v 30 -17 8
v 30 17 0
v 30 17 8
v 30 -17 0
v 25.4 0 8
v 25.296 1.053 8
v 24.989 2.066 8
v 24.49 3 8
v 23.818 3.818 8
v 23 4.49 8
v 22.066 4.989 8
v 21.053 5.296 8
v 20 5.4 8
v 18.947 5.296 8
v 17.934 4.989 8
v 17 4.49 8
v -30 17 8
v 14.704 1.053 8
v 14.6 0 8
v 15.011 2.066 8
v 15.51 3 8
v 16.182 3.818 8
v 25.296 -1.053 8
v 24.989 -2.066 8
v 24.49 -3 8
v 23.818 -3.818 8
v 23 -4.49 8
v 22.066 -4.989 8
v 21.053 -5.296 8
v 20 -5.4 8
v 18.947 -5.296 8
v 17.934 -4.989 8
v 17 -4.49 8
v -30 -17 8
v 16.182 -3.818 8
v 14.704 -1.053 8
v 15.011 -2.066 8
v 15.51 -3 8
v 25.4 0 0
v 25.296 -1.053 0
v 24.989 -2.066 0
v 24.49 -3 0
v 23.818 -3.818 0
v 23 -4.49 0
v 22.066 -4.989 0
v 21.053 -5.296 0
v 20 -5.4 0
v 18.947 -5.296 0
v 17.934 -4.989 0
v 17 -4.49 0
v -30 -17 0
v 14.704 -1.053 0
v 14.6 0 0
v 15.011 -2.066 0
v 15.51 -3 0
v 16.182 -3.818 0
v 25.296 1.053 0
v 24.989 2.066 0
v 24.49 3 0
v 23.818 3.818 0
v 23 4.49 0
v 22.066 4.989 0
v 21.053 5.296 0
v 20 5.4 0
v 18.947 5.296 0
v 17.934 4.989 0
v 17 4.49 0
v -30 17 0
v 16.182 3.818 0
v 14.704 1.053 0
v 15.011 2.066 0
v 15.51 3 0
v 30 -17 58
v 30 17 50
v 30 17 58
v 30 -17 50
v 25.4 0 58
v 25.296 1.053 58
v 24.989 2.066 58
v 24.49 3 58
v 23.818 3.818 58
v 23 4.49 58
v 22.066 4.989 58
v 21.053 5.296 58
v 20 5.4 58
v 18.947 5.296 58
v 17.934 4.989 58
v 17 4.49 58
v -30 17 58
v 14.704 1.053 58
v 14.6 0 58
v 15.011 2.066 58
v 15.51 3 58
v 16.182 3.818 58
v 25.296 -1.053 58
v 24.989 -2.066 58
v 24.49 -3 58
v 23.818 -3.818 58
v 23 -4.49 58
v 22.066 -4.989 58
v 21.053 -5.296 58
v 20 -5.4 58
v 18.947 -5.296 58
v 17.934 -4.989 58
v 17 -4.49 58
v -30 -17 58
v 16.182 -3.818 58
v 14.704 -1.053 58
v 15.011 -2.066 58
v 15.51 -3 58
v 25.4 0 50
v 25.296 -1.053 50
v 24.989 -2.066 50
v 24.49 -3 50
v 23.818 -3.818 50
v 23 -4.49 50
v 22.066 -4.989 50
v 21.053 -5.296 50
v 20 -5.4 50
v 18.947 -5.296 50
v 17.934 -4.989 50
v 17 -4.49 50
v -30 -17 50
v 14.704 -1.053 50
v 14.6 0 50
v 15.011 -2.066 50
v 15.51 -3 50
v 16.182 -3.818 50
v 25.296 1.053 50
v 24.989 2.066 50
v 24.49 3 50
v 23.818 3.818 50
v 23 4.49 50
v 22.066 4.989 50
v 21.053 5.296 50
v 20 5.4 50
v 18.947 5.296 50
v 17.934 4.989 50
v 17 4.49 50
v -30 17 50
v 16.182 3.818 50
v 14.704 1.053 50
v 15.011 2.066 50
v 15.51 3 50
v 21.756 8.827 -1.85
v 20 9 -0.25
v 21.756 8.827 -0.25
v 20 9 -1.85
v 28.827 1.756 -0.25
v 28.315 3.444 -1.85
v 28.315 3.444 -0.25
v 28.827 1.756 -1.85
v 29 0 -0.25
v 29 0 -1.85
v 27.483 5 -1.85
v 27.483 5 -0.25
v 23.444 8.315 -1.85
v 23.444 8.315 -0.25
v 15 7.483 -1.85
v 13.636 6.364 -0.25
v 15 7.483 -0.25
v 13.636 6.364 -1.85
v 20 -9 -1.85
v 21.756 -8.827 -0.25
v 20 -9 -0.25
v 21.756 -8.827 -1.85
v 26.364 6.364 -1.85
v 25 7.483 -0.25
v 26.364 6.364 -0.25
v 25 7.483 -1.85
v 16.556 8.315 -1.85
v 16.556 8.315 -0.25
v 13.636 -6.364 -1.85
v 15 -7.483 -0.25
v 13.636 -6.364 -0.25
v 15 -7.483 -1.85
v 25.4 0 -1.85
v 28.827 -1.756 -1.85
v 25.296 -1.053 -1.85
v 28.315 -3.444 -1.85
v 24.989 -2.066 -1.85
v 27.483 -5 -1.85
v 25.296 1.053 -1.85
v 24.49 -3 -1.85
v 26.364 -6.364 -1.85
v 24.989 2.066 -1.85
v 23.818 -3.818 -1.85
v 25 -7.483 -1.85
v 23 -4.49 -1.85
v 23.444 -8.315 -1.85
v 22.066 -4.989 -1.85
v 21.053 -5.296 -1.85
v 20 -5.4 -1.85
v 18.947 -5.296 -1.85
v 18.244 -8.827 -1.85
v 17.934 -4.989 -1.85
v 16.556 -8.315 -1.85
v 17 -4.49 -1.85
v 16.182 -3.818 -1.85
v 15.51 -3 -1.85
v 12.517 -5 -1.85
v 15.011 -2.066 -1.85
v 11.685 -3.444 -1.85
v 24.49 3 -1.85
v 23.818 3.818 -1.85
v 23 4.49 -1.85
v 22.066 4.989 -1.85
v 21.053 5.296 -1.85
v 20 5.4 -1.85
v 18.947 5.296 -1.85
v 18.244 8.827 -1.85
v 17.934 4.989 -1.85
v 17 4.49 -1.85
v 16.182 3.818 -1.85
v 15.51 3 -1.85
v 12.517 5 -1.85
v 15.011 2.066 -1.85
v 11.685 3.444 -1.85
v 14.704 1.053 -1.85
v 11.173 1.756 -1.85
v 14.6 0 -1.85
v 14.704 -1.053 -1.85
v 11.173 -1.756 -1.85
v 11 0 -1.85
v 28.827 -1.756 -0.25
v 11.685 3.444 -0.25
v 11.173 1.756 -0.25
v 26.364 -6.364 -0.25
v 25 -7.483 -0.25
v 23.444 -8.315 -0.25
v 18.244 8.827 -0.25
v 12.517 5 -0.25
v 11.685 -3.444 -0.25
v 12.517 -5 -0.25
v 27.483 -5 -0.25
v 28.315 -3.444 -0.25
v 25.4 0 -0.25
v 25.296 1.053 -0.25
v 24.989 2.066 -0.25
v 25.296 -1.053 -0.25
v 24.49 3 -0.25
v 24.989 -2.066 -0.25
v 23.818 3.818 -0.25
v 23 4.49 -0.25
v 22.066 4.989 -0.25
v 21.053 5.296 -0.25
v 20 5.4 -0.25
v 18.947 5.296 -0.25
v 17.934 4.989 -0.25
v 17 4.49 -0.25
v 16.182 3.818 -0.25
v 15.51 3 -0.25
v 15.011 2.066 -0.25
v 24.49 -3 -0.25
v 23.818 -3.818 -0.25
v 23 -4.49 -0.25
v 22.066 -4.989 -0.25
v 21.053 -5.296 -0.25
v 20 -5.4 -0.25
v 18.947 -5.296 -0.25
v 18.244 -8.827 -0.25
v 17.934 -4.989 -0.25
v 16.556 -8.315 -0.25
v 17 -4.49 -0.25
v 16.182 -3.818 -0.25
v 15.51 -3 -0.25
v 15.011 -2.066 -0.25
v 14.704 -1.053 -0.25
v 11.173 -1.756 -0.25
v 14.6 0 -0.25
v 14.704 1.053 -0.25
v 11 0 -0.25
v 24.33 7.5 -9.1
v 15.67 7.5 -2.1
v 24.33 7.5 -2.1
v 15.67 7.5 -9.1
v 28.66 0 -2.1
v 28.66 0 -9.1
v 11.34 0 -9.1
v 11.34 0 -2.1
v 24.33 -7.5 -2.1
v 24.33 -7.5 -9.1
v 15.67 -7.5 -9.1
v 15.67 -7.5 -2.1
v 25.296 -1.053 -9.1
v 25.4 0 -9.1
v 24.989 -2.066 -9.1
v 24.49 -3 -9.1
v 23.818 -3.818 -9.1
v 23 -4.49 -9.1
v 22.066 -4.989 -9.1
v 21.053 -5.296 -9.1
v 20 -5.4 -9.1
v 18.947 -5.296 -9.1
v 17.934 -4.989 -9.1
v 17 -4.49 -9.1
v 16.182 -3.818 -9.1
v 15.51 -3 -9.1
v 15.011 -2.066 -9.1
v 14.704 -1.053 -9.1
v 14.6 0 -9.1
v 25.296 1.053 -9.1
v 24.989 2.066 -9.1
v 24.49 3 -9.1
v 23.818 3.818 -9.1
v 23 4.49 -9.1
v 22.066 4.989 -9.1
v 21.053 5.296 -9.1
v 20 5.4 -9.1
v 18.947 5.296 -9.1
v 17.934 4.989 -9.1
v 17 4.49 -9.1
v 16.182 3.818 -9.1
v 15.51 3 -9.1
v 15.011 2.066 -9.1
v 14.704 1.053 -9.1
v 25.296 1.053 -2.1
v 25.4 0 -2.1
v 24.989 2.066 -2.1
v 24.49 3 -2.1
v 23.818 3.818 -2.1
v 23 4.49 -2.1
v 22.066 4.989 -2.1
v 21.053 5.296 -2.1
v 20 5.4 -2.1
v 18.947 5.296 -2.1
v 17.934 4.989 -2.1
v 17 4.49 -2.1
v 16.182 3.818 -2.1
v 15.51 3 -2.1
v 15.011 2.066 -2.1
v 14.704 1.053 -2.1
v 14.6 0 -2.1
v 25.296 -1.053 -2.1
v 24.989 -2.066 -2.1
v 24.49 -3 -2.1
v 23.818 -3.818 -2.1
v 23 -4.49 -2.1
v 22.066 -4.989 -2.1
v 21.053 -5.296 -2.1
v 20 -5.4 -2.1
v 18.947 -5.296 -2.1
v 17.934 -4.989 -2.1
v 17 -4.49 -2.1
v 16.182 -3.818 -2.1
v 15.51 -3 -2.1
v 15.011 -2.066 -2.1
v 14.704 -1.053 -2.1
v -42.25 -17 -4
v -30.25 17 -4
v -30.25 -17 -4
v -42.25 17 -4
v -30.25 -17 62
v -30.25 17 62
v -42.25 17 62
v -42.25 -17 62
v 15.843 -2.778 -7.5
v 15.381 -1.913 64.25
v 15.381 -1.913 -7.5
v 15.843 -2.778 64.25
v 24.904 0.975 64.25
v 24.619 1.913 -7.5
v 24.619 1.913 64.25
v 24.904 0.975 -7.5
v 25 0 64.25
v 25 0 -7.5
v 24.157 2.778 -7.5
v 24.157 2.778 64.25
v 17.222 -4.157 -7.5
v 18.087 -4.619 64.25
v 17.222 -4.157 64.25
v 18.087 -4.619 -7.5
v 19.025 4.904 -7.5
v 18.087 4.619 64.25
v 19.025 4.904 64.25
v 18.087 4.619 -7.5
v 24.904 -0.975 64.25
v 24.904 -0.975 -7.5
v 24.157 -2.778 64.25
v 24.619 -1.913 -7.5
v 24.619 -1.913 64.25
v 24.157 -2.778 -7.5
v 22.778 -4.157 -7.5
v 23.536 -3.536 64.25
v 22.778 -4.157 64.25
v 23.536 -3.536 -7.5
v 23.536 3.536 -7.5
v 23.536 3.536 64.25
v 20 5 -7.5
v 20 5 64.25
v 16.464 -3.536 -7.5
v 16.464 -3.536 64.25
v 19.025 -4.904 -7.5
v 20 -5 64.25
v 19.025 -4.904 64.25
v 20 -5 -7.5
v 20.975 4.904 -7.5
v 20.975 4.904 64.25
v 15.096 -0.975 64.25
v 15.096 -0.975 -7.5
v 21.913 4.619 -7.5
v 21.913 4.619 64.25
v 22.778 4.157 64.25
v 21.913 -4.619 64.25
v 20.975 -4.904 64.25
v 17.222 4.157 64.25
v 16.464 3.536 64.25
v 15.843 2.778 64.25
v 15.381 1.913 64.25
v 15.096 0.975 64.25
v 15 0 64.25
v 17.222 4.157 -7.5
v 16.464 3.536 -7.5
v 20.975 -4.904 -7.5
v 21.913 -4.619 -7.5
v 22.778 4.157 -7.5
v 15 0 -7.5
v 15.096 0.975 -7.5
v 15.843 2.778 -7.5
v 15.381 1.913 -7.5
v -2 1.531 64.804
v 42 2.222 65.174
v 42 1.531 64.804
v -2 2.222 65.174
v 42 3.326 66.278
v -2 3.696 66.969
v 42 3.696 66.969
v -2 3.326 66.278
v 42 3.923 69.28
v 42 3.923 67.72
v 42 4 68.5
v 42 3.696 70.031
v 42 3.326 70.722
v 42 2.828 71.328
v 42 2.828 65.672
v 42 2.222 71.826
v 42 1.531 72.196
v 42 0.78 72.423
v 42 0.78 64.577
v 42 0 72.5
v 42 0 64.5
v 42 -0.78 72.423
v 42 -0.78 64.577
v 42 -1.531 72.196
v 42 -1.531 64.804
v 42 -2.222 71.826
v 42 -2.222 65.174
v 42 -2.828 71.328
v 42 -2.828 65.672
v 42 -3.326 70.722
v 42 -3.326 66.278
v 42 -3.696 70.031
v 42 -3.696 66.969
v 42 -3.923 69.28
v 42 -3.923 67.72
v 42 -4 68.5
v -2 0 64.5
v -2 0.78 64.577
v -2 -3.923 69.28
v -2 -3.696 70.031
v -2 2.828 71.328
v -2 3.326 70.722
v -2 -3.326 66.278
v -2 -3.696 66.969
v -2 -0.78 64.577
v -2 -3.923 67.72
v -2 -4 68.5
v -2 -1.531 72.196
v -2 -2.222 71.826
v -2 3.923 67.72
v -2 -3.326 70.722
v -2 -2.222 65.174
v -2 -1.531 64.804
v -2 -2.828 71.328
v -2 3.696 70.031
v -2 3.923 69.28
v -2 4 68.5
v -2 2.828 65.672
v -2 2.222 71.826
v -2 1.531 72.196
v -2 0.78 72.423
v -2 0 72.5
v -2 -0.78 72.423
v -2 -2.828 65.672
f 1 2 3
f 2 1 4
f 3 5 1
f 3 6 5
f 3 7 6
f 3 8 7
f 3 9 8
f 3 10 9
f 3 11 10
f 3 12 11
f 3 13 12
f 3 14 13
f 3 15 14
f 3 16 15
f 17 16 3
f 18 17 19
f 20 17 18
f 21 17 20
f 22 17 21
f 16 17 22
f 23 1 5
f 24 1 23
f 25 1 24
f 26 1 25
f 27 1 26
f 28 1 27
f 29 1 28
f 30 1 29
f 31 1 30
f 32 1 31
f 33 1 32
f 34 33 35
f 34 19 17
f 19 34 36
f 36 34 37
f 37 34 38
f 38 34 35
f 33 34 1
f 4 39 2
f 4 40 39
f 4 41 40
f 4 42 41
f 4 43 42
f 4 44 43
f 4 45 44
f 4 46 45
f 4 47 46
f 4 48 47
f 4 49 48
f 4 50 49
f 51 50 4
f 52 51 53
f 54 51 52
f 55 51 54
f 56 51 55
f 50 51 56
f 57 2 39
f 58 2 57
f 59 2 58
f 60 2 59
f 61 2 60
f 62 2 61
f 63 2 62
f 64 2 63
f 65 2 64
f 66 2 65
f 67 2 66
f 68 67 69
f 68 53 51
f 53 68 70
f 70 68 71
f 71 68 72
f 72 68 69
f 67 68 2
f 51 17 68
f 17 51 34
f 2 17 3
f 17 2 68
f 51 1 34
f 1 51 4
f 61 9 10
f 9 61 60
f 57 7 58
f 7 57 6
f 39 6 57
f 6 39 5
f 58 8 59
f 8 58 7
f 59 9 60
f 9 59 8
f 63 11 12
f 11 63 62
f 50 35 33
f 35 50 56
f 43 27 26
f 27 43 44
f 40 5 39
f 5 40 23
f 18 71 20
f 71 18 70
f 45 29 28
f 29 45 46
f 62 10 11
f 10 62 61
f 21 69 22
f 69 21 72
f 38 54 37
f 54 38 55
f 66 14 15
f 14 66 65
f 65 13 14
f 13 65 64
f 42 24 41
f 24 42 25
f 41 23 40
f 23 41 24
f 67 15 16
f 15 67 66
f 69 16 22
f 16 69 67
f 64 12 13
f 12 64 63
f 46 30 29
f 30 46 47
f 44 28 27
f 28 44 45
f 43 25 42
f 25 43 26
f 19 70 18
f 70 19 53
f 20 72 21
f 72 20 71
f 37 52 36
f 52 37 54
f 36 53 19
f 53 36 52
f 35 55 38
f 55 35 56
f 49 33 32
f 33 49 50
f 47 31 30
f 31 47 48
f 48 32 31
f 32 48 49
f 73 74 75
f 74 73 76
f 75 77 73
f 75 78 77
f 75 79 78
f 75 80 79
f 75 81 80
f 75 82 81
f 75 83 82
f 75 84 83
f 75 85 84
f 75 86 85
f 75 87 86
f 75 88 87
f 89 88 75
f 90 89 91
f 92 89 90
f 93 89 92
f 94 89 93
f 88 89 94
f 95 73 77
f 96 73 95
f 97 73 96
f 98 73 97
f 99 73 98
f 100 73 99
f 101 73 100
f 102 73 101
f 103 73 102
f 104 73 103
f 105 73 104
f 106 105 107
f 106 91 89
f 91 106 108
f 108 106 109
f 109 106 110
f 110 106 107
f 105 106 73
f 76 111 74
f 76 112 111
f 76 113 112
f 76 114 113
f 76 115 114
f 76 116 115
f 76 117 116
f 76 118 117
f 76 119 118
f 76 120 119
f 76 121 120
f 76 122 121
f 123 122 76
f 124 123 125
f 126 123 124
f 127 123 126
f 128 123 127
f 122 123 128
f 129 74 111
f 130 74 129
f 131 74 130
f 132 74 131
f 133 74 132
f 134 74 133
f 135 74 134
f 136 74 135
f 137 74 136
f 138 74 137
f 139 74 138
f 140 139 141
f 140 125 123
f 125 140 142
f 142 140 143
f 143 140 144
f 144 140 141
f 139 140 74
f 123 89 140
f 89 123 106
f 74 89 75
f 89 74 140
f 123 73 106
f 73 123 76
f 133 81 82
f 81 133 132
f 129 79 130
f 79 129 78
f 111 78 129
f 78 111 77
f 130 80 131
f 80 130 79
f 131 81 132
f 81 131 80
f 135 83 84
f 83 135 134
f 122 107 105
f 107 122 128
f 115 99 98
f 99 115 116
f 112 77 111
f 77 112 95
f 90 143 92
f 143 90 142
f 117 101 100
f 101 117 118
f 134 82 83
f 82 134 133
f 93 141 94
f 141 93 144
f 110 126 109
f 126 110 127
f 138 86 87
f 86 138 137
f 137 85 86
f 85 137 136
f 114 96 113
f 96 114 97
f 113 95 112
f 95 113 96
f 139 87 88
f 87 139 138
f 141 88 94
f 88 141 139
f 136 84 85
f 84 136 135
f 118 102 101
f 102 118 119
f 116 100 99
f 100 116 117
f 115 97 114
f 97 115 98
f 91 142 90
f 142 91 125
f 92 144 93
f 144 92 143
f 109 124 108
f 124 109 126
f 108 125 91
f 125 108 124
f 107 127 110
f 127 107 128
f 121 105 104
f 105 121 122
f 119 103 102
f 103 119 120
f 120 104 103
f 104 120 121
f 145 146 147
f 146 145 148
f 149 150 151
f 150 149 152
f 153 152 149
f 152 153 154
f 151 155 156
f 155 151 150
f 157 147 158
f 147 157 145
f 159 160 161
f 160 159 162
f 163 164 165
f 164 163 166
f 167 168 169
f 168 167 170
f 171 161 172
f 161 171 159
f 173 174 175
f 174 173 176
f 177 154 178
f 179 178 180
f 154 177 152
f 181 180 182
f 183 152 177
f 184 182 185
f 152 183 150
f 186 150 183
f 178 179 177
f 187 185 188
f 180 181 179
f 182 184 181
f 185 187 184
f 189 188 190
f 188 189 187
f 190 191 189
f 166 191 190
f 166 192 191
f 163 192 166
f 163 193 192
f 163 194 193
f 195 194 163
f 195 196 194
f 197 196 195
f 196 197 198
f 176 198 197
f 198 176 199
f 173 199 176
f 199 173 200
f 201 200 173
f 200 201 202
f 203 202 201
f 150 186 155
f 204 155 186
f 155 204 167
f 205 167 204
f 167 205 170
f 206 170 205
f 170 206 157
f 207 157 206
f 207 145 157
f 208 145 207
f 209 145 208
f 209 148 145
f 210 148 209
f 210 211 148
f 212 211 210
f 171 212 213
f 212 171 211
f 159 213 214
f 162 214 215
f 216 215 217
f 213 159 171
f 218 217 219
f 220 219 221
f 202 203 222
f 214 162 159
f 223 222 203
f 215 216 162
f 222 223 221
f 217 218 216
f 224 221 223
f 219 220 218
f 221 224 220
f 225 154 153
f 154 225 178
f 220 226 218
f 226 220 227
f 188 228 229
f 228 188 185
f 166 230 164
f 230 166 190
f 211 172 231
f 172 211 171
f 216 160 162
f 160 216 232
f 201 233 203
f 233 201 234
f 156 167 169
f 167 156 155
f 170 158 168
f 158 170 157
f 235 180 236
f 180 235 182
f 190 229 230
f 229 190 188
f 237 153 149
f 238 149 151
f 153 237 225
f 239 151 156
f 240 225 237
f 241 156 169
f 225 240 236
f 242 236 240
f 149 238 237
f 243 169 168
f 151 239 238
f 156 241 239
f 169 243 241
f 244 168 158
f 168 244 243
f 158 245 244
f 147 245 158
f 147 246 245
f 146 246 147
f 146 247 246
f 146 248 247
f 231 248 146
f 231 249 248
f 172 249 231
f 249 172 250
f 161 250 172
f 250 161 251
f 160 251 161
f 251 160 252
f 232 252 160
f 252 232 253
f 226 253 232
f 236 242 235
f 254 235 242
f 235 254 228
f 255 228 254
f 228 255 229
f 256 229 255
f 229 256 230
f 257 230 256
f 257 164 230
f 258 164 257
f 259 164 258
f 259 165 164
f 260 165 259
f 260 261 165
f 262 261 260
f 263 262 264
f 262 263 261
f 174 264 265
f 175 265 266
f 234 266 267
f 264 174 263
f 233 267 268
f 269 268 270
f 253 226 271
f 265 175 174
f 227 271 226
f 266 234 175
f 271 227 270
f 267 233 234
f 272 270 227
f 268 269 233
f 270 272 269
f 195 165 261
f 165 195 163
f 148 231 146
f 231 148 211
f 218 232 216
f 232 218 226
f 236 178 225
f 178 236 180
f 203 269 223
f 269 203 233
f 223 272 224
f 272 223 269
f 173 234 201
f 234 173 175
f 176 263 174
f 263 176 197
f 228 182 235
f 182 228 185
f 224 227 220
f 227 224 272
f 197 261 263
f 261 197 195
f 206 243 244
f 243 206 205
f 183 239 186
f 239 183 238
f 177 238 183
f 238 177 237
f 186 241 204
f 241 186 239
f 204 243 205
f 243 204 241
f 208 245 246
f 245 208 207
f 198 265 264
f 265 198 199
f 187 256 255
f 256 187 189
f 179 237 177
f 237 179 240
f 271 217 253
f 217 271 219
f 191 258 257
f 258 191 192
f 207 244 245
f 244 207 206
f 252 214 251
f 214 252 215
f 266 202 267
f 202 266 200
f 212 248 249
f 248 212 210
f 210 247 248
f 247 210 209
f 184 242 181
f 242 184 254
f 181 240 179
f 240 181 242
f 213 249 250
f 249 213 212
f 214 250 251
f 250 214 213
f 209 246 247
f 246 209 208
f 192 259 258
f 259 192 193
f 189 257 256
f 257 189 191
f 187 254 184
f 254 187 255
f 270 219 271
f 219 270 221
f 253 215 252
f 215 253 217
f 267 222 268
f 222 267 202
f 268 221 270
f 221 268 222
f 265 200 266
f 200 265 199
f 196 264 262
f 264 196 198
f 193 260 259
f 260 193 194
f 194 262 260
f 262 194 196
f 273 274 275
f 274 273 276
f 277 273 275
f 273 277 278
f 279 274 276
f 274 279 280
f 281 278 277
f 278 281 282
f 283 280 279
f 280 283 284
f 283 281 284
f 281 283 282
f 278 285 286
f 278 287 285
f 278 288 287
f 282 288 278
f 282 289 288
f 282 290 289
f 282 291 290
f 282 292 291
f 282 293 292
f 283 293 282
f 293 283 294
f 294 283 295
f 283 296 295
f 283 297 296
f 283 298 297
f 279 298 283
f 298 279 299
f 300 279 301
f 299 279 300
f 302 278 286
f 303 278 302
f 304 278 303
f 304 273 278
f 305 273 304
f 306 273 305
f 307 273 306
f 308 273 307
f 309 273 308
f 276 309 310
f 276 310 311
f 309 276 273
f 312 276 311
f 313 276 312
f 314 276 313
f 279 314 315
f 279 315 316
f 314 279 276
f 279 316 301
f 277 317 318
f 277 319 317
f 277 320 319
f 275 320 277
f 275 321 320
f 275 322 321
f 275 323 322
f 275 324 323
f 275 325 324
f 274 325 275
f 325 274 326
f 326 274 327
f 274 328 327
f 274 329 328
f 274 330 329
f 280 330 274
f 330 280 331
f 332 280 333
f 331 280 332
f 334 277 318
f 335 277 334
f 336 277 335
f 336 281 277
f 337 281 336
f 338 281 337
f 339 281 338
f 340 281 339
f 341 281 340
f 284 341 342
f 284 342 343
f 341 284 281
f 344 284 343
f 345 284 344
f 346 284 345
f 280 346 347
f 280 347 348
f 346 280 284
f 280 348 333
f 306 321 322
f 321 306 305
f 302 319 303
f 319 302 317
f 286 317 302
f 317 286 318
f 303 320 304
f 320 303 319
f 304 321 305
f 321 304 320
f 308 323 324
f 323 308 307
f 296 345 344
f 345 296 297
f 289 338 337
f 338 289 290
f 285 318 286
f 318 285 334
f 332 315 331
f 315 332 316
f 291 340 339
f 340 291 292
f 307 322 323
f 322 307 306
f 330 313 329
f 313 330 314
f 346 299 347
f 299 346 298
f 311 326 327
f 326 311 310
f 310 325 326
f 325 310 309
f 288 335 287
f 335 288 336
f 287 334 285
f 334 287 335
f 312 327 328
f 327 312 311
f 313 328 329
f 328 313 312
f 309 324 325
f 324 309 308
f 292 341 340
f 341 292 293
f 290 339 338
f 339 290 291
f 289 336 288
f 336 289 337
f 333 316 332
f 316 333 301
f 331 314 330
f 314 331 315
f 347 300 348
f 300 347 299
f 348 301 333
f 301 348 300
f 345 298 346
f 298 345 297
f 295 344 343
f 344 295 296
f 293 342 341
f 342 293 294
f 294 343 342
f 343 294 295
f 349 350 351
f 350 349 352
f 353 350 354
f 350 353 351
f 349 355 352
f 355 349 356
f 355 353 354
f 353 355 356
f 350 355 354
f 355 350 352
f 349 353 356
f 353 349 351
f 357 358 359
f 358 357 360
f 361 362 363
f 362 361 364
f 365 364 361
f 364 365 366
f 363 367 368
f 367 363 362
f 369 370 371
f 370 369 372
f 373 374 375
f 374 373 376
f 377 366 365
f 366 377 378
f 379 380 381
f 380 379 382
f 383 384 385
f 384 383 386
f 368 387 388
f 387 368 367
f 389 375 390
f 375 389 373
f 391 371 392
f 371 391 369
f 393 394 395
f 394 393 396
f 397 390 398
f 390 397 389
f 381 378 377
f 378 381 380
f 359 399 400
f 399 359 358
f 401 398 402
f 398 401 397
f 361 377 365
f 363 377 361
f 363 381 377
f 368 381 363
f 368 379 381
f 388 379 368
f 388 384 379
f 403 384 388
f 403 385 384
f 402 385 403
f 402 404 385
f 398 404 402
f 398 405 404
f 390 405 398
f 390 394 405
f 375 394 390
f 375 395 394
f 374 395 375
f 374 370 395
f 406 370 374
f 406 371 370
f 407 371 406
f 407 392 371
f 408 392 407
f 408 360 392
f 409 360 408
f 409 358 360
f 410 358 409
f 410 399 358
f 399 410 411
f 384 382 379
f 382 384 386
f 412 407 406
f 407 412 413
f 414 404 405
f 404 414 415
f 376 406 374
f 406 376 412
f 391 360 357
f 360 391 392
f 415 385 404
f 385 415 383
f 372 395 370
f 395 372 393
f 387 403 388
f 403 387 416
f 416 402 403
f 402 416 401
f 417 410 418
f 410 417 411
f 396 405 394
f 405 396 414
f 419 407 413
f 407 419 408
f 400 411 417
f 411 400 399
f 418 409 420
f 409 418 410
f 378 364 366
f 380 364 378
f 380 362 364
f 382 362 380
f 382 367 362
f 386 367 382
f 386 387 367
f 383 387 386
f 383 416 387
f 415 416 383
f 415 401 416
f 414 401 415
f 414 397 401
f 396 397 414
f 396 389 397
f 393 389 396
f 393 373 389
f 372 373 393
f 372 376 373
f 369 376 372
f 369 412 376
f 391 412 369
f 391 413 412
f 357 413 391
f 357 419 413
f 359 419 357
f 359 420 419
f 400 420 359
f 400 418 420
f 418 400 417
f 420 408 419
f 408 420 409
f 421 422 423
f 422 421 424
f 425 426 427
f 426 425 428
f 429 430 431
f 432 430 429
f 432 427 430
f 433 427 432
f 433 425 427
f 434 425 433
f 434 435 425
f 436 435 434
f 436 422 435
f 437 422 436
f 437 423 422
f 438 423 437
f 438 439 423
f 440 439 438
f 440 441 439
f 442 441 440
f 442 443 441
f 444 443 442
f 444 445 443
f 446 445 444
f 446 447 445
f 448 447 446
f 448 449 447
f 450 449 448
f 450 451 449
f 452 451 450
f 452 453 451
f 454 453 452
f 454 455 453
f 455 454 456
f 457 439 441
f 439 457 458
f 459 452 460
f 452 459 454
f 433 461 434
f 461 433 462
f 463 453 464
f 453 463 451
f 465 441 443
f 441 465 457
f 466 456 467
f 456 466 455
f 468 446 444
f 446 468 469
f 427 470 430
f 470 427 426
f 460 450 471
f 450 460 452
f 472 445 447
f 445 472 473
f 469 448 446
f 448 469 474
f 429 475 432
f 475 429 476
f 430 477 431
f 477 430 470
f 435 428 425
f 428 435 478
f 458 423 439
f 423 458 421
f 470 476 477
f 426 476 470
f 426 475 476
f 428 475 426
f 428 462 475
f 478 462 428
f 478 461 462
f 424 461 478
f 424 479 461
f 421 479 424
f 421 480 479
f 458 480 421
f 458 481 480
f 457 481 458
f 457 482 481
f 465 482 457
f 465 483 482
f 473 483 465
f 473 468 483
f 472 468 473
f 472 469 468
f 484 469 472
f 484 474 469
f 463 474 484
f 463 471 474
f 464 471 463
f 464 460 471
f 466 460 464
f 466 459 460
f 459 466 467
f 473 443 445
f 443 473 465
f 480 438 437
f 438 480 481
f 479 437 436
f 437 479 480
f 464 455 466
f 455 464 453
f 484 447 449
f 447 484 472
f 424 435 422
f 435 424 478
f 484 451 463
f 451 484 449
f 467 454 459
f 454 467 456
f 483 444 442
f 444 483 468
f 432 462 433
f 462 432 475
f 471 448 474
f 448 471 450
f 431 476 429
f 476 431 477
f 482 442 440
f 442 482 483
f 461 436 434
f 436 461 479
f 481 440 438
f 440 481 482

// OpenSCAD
$fn = 32;

// ------------------------------------------------------------------------
// C clamp: throat 50 mm, screw d10
// Every part is its own module, assembly() places every instance.
// ------------------------------------------------------------------------

// --- part 1 ---
module clamp_arm() {
  difference() {
    translate([-30, -17, 0]) cube([60, 34, 8]);
    translate([20, 0, -1]) cylinder(h = 10, d = 10.8);
  }
}

// --- part 2 ---
module clamp_spine() {
  difference() {
    translate([-33, -17, 0]) cube([66, 34, 12]);
  }
}

// --- part 3 ---
module clamp_screw() {
  translate([0, 0, -35.875]) cylinder(h = 71.75, d = 10);
}

// --- part 4 ---
module clamp_washer() {
  difference() {
      translate([0, 0, 0]) cylinder(h = 1.6, d = 18);
      translate([0, 0, -1]) cylinder(h = 3.6, d = 10.8);
    }
}

// --- part 5 ---
module clamp_nut() {
  difference() {
    linear_extrude(height = 7) polygon(points = [[8.66, 0], [4.33, 7.5], [-4.33, 7.5], [-8.66, 0], [-4.33, -7.5], [4.33, -7.5]]);
    translate([0, 0, -1]) cylinder(h = 9, d = 10.8);
  }
}

// --- part 6 ---
module tommy_bar() {
  translate([0, 0, -22]) cylinder(h = 44, d = 8);
}

// --- assembly ---
module assembly() {
  color([0.80, 0.24, 0.20]) translate([0, 0, 0]) rotate([0, 0, 0]) clamp_arm();
  color([0.20, 0.45, 0.75]) translate([0, 0, 50]) rotate([0, 0, 0]) clamp_arm();
  color([0.25, 0.62, 0.32]) translate([-42.25, 0, 29]) rotate([0, 90, 0]) clamp_spine();
  color([0.92, 0.70, 0.18]) translate([20, 0, 28.375]) rotate([0, 0, 0]) clamp_screw();
  color([0.58, 0.35, 0.70]) translate([20, 0, -1.85]) rotate([0, 0, 0]) clamp_washer();
  color([0.16, 0.66, 0.66]) translate([20, 0, -9.1]) rotate([0, 0, 0]) clamp_nut();
  color([0.85, 0.48, 0.18]) translate([20, 0, 68.5]) rotate([0, 90, 0]) tommy_bar();
}

assembly();
